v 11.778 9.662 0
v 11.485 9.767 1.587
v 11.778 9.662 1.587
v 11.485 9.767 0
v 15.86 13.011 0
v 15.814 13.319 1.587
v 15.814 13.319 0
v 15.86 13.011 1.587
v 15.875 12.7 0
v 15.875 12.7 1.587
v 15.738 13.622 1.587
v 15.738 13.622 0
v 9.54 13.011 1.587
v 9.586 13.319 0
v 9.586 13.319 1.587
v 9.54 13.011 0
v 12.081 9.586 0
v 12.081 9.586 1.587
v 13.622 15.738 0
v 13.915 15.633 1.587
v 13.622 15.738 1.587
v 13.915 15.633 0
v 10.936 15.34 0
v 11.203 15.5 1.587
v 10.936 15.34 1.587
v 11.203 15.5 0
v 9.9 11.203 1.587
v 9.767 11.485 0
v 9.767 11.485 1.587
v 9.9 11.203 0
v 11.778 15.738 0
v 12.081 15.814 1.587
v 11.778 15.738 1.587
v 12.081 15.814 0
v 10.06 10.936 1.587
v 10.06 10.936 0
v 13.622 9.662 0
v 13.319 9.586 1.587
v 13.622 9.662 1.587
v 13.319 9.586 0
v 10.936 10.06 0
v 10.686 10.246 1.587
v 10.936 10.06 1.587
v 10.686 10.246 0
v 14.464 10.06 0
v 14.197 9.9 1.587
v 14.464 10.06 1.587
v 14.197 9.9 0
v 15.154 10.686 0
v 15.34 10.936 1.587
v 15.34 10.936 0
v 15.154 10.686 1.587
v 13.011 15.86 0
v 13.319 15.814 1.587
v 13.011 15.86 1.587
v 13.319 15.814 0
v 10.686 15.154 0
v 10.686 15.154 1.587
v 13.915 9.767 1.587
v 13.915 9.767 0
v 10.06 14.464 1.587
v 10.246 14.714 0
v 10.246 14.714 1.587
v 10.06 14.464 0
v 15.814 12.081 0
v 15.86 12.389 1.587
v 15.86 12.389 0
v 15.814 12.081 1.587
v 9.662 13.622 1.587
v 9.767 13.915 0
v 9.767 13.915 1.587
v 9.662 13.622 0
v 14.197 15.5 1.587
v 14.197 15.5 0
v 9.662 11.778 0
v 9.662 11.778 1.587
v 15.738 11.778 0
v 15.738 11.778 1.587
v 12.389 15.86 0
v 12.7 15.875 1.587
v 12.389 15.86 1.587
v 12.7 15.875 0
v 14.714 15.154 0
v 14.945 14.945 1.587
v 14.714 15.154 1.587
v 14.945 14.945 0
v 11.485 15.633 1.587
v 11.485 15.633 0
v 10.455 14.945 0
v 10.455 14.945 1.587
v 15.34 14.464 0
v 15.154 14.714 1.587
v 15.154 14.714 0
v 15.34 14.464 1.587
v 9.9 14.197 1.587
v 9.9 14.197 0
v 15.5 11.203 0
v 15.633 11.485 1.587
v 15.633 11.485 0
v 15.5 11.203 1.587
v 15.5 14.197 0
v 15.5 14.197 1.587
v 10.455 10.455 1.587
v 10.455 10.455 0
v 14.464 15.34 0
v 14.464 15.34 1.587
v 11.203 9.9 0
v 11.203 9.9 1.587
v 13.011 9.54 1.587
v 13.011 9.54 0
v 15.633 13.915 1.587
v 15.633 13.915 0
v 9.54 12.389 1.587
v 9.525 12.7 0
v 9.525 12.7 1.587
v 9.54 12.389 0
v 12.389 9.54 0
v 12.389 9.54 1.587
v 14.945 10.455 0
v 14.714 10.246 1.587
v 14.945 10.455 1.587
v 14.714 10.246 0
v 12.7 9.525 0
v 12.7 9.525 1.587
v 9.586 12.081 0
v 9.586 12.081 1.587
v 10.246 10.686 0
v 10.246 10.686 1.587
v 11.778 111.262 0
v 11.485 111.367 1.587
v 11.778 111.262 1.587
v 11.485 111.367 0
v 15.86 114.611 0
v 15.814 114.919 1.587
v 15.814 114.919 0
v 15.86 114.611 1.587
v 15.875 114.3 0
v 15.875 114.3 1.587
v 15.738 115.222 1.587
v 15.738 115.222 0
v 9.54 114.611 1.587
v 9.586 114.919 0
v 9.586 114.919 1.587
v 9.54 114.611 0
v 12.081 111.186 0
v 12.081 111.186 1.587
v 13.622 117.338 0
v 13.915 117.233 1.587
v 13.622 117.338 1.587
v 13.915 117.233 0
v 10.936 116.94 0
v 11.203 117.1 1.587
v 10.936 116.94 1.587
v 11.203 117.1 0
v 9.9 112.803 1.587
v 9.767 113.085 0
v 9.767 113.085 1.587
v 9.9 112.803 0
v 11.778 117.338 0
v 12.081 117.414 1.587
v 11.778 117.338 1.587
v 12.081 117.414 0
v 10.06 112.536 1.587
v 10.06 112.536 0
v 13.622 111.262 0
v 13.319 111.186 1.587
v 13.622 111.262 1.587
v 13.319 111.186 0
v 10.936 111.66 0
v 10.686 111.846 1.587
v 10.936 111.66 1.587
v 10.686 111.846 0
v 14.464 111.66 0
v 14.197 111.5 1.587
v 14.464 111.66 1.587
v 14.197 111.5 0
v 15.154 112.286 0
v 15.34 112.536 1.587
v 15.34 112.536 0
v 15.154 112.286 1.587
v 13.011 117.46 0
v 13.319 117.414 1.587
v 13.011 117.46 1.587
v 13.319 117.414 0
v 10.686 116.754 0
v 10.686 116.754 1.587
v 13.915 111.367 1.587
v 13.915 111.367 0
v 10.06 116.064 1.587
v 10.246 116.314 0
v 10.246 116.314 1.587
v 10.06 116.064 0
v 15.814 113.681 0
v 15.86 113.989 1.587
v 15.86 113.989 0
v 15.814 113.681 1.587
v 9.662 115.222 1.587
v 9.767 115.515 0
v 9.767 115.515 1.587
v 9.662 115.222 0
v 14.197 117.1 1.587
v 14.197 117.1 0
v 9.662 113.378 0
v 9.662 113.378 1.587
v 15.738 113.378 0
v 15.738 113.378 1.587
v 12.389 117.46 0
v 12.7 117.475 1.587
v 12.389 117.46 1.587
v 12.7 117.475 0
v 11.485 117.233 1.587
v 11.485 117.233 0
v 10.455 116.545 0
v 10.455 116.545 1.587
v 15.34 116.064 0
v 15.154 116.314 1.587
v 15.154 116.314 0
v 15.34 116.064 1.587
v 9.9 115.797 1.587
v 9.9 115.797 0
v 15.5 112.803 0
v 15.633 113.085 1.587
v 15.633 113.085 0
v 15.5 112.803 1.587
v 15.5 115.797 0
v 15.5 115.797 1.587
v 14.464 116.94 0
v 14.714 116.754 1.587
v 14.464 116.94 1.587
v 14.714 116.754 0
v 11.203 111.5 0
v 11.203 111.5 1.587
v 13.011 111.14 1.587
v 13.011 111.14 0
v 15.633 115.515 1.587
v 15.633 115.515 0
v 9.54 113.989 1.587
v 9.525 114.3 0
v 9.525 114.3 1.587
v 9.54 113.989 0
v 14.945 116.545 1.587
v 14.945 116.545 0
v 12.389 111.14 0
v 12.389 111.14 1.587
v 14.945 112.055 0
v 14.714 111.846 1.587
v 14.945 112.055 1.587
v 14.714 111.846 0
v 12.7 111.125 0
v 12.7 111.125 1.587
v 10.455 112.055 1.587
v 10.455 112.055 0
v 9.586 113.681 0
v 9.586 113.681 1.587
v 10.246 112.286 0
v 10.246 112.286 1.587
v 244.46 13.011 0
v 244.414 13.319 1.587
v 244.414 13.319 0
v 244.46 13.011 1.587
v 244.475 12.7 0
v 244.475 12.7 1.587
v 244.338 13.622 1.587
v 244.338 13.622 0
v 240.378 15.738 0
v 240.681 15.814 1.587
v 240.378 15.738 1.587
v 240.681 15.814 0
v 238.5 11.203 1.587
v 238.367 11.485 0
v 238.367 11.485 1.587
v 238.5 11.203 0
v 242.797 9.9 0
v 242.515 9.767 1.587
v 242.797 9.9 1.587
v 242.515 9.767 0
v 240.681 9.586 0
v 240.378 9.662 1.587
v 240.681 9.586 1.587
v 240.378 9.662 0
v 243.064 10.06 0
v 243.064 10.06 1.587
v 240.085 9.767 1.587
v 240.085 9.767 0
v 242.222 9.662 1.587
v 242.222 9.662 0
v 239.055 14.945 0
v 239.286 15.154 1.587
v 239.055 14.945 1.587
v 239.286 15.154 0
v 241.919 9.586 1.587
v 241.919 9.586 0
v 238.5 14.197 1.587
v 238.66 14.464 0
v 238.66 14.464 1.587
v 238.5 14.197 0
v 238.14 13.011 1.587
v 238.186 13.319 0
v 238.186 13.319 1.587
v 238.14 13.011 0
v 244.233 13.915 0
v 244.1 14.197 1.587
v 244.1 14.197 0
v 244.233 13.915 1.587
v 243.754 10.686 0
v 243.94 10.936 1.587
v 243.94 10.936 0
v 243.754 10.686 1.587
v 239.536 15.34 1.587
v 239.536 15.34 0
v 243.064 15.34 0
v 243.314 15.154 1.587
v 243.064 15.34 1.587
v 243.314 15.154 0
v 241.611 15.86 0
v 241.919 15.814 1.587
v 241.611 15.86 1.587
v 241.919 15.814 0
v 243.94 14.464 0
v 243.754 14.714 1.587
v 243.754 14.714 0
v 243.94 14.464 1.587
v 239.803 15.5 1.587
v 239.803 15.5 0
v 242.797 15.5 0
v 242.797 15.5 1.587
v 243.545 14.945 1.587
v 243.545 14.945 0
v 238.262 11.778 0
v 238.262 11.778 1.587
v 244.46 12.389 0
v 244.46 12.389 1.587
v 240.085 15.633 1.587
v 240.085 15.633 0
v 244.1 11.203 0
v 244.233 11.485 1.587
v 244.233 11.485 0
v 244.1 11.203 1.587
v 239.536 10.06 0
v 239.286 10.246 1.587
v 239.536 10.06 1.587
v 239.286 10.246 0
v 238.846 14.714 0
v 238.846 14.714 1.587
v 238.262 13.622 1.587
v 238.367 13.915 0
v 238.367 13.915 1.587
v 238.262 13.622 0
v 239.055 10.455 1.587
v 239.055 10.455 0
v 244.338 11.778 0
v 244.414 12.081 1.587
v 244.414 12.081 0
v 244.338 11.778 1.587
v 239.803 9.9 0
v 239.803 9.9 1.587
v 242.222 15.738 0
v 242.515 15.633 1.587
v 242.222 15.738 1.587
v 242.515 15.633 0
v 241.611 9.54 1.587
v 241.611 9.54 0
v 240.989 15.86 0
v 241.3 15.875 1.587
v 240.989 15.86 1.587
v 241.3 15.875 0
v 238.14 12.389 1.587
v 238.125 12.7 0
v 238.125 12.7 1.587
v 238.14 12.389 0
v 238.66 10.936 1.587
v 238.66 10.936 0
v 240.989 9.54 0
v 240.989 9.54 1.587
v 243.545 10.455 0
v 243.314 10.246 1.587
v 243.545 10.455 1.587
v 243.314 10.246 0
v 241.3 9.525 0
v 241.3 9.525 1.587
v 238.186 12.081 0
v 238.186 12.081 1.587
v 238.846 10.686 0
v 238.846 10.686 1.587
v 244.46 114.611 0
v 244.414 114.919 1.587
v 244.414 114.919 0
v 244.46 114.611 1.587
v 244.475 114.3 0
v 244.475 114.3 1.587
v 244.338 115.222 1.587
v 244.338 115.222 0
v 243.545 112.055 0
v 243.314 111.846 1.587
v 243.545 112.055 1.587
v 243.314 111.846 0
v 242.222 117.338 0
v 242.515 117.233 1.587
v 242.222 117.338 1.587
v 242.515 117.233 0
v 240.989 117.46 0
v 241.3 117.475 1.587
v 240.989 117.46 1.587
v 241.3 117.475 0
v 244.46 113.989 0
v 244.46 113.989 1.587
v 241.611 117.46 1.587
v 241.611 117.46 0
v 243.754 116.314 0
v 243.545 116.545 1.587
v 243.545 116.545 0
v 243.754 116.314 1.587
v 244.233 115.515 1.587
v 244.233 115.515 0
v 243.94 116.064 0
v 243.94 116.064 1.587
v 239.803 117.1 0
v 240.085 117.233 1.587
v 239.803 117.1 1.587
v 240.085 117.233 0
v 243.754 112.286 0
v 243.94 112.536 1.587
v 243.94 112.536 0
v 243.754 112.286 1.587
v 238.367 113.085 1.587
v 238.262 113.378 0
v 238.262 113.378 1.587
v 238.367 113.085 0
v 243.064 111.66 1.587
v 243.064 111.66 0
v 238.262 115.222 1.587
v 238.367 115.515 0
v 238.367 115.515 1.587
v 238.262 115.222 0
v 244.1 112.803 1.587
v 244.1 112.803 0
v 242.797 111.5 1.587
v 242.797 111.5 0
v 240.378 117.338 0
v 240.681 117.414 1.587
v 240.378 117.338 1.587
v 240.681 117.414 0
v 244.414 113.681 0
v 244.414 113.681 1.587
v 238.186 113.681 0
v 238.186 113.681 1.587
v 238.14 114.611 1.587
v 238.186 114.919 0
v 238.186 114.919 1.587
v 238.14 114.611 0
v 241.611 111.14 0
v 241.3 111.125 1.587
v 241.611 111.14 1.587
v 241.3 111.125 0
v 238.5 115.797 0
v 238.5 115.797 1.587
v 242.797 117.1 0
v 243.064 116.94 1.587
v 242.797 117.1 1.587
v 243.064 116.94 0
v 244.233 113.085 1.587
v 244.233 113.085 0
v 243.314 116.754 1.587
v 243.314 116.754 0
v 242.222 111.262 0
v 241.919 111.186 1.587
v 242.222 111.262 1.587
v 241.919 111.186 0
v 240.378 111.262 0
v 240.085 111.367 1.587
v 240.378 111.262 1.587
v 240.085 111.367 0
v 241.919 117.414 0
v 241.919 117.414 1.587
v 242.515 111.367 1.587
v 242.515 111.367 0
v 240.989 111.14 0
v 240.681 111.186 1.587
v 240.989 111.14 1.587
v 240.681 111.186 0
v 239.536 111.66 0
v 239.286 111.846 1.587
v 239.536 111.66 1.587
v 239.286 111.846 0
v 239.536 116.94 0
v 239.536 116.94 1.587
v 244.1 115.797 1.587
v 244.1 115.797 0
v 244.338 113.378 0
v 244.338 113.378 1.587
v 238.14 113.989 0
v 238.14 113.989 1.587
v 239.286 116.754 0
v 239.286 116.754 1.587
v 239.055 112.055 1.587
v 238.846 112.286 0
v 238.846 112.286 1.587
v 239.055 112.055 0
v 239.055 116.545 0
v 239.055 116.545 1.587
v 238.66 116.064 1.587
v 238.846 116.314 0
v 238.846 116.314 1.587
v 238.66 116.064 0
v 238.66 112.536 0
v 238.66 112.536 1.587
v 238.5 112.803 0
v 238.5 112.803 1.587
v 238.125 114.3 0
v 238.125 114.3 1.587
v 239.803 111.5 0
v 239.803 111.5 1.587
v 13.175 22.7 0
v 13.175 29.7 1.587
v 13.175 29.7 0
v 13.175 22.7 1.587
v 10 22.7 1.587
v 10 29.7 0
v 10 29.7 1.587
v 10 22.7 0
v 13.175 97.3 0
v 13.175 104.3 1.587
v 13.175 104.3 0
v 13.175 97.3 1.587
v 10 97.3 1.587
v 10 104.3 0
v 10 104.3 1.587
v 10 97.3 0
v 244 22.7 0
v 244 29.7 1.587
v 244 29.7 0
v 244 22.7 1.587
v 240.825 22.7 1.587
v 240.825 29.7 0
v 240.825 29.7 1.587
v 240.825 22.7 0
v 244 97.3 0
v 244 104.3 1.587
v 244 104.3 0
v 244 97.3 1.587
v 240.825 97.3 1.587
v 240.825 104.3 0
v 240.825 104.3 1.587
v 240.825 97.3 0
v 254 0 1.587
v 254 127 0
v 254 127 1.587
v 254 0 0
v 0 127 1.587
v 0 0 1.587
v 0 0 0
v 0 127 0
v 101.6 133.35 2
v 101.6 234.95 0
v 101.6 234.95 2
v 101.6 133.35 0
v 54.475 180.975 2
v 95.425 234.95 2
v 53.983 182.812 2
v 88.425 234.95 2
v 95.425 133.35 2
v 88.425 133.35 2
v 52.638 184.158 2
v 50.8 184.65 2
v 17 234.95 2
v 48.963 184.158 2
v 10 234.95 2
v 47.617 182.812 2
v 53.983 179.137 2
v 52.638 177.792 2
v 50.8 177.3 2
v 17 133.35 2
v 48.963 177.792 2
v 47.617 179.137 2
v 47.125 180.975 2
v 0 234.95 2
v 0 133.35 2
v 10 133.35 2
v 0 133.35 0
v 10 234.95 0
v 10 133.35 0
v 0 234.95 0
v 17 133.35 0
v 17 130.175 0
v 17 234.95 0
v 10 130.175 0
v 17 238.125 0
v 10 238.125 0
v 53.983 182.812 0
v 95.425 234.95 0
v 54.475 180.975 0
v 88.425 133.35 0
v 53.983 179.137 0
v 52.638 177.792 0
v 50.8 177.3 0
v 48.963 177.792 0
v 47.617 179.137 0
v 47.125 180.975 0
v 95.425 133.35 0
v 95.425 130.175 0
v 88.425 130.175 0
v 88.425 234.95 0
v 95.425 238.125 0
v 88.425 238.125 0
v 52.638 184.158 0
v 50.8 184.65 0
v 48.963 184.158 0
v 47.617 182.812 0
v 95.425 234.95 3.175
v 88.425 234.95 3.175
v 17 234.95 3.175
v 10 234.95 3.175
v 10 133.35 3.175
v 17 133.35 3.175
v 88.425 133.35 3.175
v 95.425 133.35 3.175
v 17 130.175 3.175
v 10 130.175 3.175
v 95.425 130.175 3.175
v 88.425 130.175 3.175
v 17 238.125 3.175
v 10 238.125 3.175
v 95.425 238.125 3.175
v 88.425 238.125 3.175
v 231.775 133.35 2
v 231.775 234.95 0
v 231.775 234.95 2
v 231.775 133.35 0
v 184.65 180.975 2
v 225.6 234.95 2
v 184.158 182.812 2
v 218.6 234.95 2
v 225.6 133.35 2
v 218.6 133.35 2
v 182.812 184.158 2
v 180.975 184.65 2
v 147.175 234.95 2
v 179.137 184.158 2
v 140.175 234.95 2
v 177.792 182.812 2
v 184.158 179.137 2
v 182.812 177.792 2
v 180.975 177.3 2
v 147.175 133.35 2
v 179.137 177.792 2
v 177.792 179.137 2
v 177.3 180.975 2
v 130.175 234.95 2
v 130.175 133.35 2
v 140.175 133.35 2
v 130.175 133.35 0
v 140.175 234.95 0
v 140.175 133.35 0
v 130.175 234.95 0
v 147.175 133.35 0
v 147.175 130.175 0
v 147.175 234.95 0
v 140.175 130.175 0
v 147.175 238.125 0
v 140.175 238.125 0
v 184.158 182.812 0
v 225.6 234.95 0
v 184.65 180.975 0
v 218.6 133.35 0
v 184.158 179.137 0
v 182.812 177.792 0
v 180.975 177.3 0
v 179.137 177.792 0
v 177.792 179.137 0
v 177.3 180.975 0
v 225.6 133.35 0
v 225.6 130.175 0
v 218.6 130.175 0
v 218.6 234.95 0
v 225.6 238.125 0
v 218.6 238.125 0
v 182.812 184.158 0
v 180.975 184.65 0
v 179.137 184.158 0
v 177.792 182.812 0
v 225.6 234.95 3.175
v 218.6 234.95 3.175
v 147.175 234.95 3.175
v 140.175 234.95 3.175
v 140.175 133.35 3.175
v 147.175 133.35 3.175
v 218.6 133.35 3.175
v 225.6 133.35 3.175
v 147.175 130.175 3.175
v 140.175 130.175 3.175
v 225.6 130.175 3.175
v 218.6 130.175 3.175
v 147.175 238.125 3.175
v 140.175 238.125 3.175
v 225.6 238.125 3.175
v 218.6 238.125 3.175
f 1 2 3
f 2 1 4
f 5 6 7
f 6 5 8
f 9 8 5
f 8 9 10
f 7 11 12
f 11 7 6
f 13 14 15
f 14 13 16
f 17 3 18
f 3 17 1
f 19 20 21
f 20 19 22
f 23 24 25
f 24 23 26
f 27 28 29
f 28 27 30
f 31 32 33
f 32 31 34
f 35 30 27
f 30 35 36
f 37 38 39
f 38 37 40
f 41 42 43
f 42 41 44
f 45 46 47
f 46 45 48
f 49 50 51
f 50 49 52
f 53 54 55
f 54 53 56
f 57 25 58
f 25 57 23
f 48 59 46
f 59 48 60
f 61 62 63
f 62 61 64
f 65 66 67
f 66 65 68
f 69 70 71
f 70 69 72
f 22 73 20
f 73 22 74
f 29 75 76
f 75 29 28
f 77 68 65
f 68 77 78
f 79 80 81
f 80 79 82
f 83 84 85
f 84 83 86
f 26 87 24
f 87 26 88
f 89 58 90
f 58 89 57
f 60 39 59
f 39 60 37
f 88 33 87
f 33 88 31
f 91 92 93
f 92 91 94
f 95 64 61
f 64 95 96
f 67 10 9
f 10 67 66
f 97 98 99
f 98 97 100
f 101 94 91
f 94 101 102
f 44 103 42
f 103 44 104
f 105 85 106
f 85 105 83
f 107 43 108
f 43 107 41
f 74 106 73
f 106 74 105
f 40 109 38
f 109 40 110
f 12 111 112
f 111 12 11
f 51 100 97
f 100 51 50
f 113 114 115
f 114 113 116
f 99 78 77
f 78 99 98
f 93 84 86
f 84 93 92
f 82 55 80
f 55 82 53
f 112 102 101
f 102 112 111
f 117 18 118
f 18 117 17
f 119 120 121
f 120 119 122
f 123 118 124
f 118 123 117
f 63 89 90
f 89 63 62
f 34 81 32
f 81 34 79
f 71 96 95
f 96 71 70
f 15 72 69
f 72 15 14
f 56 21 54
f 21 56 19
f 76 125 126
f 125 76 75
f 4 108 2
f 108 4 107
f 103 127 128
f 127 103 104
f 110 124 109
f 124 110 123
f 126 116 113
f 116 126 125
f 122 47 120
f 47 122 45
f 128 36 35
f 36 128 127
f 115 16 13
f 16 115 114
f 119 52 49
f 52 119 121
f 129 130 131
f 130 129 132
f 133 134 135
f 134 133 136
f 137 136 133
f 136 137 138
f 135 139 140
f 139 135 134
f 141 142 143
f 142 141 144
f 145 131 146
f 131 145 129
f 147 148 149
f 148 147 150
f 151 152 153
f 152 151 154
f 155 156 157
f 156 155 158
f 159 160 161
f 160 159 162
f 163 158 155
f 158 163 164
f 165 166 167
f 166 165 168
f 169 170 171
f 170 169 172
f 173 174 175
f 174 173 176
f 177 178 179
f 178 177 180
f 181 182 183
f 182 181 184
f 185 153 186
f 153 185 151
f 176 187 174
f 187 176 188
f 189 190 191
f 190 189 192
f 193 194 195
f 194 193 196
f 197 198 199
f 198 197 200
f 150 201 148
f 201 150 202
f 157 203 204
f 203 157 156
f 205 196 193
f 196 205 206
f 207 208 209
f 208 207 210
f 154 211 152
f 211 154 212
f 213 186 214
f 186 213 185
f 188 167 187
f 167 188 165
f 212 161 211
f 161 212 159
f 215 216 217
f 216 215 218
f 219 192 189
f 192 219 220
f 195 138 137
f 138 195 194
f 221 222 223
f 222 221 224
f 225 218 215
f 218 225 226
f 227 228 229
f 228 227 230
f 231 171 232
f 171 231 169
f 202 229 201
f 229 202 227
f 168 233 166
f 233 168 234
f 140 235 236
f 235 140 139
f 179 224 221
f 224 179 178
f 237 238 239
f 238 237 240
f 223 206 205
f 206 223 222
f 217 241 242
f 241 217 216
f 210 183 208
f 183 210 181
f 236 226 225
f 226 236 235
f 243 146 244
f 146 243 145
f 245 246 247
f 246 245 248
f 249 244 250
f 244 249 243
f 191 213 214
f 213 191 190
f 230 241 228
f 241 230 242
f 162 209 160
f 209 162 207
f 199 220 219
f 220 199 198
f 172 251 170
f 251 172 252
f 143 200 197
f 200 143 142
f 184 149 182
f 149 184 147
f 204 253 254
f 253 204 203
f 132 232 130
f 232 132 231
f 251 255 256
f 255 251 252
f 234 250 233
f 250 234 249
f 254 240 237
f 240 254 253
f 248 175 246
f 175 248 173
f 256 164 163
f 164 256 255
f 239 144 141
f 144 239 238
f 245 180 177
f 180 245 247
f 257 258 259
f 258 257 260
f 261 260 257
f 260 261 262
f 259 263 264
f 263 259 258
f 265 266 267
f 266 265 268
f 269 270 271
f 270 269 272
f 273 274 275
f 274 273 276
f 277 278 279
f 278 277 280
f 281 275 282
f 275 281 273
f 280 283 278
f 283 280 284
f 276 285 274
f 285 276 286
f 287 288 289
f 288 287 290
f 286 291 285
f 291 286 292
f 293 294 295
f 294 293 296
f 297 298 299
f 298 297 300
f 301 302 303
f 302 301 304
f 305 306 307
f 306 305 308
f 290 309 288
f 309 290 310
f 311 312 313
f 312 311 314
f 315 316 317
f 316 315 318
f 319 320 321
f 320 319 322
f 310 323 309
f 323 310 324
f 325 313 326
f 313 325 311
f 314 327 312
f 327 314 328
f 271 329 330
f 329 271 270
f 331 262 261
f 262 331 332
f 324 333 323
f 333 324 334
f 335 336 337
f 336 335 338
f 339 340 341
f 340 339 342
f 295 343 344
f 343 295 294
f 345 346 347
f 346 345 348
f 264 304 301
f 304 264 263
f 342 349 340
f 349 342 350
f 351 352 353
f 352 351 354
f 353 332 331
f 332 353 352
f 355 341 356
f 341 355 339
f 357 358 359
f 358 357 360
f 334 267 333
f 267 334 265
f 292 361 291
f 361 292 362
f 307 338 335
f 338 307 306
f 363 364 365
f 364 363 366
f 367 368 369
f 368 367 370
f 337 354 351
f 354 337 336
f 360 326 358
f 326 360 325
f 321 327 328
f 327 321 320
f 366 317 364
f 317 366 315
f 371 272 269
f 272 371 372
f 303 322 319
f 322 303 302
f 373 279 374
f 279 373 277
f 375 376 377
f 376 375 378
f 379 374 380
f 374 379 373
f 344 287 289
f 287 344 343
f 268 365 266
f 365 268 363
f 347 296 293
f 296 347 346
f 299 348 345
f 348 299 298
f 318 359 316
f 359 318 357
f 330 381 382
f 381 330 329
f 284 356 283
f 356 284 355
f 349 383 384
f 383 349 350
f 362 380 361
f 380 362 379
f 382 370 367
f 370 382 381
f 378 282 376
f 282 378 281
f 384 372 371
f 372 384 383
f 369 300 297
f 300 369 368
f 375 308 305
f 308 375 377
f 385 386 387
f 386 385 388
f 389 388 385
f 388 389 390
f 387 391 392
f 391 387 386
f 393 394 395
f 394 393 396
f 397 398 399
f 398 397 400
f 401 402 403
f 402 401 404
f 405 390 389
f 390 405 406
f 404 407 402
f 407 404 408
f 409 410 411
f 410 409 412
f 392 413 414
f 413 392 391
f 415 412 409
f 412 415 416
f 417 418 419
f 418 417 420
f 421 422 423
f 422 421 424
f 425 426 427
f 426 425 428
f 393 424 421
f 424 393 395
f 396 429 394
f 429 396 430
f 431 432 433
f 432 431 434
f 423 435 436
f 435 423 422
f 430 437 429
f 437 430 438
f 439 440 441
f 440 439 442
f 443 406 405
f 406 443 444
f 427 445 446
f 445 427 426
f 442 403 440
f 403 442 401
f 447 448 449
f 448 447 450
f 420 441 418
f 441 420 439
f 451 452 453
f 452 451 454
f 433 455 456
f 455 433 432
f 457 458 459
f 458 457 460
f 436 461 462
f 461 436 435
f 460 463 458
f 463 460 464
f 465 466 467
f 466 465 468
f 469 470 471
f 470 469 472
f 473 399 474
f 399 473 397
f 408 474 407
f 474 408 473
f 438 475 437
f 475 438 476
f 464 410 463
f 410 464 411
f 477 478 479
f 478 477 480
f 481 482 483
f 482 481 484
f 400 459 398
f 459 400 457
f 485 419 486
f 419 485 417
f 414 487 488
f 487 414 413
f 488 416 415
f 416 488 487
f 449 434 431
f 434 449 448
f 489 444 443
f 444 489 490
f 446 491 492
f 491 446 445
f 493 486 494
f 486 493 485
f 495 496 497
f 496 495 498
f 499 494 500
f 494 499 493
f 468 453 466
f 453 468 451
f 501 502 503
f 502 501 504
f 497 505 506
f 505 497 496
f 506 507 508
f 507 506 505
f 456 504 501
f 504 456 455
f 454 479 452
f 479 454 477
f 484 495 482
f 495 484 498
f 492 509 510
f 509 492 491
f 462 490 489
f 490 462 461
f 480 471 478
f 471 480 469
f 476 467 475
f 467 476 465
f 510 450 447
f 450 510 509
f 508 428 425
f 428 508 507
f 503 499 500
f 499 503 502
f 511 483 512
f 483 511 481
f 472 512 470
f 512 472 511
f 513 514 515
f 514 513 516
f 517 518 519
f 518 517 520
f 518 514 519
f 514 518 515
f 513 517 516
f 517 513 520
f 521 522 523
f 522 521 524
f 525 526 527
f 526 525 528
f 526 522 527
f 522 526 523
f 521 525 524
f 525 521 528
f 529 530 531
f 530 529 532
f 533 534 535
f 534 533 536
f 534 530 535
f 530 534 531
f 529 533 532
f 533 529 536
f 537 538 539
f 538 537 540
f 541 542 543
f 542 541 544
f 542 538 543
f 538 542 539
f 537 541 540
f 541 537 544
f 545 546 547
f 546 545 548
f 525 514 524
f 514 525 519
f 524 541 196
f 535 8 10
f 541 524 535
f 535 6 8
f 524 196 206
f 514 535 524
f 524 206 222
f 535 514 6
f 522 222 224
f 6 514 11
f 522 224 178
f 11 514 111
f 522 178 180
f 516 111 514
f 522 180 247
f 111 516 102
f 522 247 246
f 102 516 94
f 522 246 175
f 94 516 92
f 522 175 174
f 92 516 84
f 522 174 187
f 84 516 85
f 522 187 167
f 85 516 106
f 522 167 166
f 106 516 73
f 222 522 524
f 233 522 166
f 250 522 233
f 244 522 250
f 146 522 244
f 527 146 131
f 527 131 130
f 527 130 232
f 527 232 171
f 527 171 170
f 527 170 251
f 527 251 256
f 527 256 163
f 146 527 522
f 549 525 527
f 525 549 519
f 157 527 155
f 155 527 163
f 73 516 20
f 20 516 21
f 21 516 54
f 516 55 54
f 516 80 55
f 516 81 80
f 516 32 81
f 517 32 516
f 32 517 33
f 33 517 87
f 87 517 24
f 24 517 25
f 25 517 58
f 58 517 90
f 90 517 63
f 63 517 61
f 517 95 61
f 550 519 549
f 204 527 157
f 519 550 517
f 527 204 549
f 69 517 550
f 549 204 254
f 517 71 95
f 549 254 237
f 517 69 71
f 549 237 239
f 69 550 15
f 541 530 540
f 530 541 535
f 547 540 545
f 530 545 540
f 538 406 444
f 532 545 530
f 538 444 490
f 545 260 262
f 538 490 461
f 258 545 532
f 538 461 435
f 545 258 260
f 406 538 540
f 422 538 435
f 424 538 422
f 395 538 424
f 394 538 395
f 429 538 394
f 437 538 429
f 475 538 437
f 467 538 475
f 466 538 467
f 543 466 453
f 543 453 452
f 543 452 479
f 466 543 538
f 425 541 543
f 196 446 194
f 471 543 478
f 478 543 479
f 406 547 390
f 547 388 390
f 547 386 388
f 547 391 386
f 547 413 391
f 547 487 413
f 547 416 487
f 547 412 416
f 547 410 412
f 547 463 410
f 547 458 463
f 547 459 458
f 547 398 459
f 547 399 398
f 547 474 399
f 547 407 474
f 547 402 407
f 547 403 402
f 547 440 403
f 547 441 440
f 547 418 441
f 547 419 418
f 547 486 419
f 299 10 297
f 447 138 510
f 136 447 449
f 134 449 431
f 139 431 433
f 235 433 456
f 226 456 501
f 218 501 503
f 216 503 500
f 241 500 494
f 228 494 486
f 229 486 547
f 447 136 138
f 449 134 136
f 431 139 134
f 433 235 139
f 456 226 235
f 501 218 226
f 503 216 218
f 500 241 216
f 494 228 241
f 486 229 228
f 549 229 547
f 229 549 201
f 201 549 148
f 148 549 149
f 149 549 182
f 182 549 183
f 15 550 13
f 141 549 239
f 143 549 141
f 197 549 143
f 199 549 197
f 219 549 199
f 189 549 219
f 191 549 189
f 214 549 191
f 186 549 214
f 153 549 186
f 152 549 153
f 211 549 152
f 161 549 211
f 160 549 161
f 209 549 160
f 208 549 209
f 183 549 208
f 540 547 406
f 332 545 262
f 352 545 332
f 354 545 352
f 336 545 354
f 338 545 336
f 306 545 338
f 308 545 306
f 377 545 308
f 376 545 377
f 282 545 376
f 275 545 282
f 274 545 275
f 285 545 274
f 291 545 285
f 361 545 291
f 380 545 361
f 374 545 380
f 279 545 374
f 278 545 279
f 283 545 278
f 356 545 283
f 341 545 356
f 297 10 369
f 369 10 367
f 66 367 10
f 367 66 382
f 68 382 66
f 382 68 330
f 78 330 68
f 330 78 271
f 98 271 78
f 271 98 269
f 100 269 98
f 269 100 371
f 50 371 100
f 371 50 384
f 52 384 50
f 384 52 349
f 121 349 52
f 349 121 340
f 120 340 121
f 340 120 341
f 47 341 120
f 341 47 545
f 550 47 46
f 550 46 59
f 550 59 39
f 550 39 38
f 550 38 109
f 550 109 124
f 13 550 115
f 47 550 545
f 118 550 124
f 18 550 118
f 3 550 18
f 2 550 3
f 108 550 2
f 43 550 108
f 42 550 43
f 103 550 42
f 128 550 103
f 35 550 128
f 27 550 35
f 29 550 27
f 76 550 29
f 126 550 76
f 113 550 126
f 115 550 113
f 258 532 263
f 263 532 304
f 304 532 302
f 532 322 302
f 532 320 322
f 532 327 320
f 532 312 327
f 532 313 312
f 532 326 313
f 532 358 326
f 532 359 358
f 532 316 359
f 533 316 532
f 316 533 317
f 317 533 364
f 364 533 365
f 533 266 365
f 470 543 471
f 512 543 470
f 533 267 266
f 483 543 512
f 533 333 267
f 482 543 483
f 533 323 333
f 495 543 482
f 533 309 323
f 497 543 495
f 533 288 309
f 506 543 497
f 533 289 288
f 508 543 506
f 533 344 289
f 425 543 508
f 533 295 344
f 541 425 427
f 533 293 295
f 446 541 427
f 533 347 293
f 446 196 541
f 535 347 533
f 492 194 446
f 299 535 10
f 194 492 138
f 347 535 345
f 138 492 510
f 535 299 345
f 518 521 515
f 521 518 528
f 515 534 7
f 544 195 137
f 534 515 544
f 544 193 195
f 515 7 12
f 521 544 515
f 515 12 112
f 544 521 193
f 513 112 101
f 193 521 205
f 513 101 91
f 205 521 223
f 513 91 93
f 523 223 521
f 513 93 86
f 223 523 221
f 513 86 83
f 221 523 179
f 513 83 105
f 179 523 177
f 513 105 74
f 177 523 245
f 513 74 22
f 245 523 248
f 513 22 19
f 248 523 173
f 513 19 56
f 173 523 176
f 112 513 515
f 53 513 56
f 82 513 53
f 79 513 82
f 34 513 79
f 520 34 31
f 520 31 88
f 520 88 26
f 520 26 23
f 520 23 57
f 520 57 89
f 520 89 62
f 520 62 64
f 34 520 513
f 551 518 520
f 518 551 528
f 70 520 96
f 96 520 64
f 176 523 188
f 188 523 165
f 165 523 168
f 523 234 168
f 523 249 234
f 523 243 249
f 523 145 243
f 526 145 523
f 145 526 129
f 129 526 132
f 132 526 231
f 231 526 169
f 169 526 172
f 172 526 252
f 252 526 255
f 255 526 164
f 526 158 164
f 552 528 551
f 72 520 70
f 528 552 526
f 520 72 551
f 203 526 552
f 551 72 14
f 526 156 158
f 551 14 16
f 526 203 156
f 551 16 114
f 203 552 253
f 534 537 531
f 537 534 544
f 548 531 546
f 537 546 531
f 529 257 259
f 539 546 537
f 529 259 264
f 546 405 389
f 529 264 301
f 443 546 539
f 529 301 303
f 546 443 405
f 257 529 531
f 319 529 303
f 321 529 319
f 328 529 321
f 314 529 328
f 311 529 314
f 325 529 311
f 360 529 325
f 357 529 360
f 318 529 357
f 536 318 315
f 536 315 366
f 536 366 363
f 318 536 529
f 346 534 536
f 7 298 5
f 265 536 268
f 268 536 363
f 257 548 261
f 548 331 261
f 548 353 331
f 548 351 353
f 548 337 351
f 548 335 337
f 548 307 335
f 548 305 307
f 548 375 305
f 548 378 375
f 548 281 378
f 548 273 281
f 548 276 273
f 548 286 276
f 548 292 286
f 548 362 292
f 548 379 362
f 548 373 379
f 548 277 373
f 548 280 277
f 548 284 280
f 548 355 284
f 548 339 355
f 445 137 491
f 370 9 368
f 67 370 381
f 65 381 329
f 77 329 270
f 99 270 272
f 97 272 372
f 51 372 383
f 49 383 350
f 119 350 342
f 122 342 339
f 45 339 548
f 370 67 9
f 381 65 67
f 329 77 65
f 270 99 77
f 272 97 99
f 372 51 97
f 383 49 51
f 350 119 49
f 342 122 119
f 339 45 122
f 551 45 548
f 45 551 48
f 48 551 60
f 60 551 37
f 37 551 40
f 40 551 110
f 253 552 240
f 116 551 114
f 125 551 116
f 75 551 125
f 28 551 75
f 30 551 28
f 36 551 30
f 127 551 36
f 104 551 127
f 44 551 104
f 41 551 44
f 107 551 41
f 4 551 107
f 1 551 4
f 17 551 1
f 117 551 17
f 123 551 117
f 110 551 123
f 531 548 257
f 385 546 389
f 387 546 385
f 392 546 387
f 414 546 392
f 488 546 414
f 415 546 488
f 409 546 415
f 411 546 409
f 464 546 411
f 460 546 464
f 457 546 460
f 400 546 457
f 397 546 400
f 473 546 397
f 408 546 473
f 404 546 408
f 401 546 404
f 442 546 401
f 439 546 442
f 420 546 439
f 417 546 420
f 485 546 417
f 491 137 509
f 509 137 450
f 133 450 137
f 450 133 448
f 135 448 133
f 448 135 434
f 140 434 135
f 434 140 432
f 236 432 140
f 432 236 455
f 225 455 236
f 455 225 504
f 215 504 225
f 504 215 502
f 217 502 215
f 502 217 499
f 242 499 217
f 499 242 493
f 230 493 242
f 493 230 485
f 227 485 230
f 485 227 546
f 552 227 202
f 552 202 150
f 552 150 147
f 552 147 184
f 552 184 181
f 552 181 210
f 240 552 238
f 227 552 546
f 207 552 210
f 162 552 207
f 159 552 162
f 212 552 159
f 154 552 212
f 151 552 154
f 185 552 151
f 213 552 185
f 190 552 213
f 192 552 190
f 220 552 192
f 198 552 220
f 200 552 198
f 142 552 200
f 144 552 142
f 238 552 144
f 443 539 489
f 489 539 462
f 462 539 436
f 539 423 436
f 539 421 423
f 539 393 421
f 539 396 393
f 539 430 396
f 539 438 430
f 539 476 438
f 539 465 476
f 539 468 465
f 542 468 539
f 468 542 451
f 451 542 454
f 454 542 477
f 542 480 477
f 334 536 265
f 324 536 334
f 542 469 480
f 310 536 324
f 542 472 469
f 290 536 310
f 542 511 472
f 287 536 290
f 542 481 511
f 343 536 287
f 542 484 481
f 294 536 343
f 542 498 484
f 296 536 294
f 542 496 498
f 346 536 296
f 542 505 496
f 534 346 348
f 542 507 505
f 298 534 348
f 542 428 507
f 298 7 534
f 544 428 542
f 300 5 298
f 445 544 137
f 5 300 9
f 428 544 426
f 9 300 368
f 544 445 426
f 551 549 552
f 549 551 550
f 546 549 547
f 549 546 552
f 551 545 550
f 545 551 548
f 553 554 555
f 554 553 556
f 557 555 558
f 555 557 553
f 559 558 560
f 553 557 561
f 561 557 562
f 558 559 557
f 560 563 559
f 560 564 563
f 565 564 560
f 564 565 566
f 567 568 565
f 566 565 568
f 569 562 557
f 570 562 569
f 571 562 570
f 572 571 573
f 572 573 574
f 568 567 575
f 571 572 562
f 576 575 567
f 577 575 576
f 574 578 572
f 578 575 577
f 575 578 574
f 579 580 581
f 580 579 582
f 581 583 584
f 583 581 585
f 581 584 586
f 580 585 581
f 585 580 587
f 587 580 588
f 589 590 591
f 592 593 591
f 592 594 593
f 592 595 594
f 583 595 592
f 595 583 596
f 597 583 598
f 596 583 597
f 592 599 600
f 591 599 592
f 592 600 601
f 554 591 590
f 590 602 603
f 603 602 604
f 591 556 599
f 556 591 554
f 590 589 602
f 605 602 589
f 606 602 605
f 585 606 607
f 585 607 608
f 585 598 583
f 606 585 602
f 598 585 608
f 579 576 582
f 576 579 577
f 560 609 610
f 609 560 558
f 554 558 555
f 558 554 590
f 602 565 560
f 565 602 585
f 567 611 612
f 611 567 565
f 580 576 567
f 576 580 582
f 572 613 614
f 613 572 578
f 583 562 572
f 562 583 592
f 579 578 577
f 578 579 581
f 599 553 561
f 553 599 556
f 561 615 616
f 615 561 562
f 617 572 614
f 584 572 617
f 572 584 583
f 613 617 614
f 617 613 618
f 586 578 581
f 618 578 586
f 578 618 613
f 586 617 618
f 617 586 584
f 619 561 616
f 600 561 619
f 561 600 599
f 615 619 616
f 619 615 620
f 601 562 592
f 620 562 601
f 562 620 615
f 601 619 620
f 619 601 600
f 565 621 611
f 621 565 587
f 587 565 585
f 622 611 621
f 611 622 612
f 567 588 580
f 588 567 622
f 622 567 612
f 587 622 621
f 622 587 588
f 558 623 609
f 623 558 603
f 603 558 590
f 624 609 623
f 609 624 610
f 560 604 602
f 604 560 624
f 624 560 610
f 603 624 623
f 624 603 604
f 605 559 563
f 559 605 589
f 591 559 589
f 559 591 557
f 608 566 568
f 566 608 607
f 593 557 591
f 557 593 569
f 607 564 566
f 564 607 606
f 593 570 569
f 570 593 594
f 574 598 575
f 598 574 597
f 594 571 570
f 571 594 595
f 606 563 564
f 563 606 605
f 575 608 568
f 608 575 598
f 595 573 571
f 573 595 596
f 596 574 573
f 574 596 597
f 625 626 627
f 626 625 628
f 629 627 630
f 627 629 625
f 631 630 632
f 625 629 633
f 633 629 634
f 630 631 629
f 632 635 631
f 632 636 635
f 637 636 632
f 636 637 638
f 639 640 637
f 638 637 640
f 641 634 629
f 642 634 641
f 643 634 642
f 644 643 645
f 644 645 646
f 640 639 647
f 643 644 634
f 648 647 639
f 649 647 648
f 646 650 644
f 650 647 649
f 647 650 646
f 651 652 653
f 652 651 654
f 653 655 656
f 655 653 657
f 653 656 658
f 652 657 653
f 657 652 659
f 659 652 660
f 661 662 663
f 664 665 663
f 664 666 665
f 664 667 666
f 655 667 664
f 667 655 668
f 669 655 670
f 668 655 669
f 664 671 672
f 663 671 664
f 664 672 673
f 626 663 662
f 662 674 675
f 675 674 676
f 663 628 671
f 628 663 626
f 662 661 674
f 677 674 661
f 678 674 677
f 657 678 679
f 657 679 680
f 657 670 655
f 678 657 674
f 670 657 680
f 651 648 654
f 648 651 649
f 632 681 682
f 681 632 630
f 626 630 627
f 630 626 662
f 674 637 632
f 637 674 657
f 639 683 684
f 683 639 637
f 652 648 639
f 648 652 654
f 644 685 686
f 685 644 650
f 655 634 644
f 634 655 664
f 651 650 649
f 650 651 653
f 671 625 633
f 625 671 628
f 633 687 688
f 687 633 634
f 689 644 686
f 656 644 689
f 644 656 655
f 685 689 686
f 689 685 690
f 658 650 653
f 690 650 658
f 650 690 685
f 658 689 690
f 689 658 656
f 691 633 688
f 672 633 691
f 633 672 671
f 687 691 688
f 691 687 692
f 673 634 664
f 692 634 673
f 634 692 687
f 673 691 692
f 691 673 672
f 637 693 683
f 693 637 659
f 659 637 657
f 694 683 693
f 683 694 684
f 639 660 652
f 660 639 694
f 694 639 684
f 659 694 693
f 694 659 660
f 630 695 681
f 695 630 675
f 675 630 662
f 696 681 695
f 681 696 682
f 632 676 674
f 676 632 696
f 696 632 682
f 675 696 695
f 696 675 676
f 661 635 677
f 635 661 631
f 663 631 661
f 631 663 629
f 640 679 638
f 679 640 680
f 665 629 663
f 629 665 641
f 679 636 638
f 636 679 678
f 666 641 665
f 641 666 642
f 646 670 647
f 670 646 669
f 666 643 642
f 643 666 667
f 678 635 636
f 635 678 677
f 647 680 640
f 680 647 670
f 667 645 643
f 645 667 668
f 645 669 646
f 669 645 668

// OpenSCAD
$thickness=3.175;
$detail=64;
$bit_diam=3.175;

$inch=25.4;

$stick_diam=$inch/4;
$tab_width=3.175;
$tab_length=7;
$major_r = 5*$inch;
$ring_size = $inch/1.9;

$side = 4 * $inch;
$tab_l = $thickness;

module make_stauntion_holes(rad, offs) {
    translate([offs, offs, -1]) {
        cylinder(r=rad, h=$thickness+2, $fn=$detail);
    }
    translate([offs, $major_r - offs, -1]) {
        cylinder(r=rad, h=$thickness+2, $fn=$detail);
    }
    translate([$major_r*2 - offs, offs, -1]) {
        cylinder(r=rad, h=$thickness+2, $fn=$detail);
    }
    translate([$major_r*2 - offs, $major_r - offs, -1]) {
        cylinder(r=rad, h=$thickness+2, $fn=$detail);
    }
}

module make_plate() {
    difference() {
        cube([$major_r*2, $major_r,$thickness/2]);
        make_stauntion_holes($stick_diam/2, $inch/2);
        make_side_slots(); 
    }
}

module make_side_slots() {
    translate([10, $inch/2+10, -1]) {
        cube([$thickness, 7, $thickness+2]);
    }
    translate([10, $major_r-($inch/2+10)-$tab_length, -1]) {
        cube([$thickness, 7, $thickness+2]);
    }
    
    translate([$major_r*2-10-$thickness, $inch/2+10 , -1]) {
        cube([$thickness, 7, $thickness+2]);
    }
    translate([$major_r*2-10-$thickness, $major_r-($inch/2+10)- $tab_length, -1]) {
        cube([$thickness, 7, $thickness+2]);
    }     
}

module make_side() {
    difference() {
        union() {
            translate([0, $thickness, 0]) {
                cube([$side, $side, 2]);
            }
            // bottom side
            translate([10,0,0]) {
                cube([7,$thickness, $thickness]);
            }
            translate([$side - 10 - $thickness,0,0]) {
                cube([7,$thickness, $thickness]);
            }
            //top side
            translate([10, $side+$thickness, 0]) {
                cube([7,$thickness, $thickness]);
            }
            translate([$side - 10 - $thickness, $side+$thickness, 0]) {
                cube([7,$thickness, $thickness]);
            }        
        }
        translate([$side/2,$side/2,-1]) {
            cylinder(r=$inch/8+ 0.5 , h=100 /*$thickness+2*/);
        }
    }
}

// lay out

module layout() {
    make_plate();
    
    translate([0, $major_r + $bit_diam, 0]) {
        make_side();
        translate([$major_r + $bit_diam,0,0]) {
            make_side();
        }
    }
}

$2d = 0;
if ($2d) {
    projection(cut=true) {
       translate([0,0,0]) rotate([0,0,0]) {
           layout();
       }
    }
} else {
    layout();
}
